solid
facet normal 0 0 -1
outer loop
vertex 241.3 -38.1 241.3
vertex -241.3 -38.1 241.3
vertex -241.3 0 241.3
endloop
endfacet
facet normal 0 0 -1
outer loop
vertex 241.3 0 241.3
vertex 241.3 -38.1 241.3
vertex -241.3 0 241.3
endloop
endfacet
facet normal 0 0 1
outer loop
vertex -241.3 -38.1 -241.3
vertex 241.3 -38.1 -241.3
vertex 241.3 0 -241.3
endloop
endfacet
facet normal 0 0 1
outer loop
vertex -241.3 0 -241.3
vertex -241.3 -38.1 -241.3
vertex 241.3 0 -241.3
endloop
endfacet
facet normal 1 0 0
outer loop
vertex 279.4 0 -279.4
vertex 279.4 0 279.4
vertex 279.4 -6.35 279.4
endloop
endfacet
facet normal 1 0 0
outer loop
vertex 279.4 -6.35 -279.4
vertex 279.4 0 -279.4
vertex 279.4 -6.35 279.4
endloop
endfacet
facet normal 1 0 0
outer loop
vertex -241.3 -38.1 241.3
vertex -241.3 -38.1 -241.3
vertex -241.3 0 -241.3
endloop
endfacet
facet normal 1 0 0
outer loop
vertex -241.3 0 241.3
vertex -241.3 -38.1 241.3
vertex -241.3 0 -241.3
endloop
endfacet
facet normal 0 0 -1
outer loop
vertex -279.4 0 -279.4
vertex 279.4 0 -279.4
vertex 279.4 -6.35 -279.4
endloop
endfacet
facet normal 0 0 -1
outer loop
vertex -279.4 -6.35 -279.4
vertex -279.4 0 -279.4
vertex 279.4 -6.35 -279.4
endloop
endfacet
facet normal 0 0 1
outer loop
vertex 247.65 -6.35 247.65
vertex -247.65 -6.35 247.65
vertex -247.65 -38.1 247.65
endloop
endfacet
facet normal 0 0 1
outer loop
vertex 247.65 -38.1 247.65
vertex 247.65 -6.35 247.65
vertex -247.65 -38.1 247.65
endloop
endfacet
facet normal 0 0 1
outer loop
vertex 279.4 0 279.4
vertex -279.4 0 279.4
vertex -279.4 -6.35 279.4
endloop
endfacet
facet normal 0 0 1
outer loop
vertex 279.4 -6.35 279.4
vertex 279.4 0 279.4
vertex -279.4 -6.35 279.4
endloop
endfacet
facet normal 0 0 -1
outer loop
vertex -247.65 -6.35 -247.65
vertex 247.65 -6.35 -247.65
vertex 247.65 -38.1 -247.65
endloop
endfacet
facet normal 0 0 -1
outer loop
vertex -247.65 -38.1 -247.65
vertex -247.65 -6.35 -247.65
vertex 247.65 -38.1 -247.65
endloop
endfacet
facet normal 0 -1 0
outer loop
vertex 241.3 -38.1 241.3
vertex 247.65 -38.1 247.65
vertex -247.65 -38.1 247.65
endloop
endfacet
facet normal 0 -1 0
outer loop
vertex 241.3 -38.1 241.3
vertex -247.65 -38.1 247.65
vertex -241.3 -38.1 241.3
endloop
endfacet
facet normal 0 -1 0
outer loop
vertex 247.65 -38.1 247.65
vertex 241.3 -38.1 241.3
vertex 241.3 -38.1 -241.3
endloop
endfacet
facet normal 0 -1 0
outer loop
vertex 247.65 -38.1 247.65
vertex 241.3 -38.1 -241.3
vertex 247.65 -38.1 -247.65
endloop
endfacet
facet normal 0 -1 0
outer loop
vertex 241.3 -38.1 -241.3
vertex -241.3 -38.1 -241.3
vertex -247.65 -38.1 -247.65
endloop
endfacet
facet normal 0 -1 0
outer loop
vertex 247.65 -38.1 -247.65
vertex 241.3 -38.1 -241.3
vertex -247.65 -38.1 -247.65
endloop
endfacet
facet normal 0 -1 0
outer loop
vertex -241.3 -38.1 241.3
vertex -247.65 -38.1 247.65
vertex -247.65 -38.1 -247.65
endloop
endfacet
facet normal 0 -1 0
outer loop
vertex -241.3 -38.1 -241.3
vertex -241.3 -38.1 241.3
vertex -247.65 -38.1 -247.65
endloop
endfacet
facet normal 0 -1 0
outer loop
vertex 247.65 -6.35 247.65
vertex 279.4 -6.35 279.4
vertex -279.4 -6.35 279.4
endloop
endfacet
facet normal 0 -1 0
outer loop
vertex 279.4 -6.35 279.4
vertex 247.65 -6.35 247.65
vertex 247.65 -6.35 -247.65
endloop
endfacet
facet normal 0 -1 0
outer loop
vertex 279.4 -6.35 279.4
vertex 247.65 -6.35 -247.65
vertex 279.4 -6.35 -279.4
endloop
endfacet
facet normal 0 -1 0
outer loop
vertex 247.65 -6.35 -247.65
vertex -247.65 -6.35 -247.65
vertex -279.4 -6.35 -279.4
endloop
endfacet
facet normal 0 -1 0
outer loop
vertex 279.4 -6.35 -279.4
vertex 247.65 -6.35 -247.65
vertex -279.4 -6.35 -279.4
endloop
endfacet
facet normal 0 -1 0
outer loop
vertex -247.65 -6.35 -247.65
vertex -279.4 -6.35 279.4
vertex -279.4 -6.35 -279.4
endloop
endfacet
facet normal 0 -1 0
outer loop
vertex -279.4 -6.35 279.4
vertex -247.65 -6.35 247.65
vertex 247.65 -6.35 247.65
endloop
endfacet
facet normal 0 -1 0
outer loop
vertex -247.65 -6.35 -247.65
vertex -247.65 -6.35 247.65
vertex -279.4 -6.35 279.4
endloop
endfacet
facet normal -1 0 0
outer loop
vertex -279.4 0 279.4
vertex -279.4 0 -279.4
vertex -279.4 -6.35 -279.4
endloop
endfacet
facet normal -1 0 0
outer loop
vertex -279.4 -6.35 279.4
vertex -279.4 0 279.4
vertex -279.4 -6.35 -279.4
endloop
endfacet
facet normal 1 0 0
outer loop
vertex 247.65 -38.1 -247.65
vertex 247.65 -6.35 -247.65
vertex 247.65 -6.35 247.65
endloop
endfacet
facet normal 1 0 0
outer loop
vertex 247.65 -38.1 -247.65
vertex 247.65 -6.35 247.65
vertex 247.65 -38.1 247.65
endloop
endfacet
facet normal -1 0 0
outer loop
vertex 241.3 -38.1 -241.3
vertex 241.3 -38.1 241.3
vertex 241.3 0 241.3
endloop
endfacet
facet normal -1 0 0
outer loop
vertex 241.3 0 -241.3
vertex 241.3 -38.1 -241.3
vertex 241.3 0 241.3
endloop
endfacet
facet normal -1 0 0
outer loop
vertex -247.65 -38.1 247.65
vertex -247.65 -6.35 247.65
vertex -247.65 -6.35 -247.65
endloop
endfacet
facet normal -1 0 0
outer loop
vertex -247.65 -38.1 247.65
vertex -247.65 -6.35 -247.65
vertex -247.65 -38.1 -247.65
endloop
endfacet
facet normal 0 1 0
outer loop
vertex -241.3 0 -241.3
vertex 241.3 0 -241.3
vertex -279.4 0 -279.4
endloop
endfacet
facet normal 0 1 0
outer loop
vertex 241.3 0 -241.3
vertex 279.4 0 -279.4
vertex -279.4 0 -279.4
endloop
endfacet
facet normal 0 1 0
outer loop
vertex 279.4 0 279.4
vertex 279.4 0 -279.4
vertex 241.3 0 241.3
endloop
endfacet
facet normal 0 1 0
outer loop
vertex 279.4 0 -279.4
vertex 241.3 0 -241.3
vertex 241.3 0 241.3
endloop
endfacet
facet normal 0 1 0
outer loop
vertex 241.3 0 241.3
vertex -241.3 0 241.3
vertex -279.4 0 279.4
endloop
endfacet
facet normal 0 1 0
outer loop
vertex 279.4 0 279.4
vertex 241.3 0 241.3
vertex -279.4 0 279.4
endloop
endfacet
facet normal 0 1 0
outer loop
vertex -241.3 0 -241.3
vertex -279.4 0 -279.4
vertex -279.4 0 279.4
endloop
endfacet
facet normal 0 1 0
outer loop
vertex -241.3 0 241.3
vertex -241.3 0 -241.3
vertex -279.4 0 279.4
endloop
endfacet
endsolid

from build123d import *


with BuildPart() as part:
    # Sweep1: sweep along a path in Sketch1
    with BuildLine(Plane(origin=(0, 0, 0), x_dir=(1, 0, 0), z_dir=(0, 1, 0))) as sweep1_path:
        Line((279.4, -279.4), (-279.4, -279.4))
        Line((-279.4, -279.4), (-279.4, 279.4))
        Line((-279.4, 279.4), (279.4, 279.4))
        Line((279.4, 279.4), (279.4, -279.4))
    # Sketch2 → Sweep1 (sweep)
    with BuildSketch(Plane.XY):
        Polygon((-279.4, 0), (-241.3, 0), (-241.3, -38.1), (-247.65, -38.1), (-247.65, -6.35), (-279.4, -6.35), align=None)
    sweep(path=sweep1_path.line, transition=Transition.RIGHT)


solid = part.part
